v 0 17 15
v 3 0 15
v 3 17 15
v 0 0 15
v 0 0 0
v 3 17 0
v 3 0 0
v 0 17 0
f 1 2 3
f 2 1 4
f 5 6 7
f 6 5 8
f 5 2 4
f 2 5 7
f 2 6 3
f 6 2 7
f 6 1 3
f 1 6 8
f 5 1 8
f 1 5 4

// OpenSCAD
// Generated by SolidPython 1.0.1 on 2020-07-29 00:46:54


cube(size = [3, 17, 15]);
/***********************************************
*********      SolidPython code:      **********
************************************************
 
# import packages: SolidPython
from solid import *
from solid.utils import *
from itertools import chain, combinations, permutations


class Resize:

    def __init__(self, scad_file):
        self.scad_file = scad_file
        #self.scad_file = import_scad(scad_file)
        # cone/cylinder param:
        self.r1 = 0
        self.r2 = 0
        self.h = 0
        # rectangular prism param:
        self.w = 0
        self.l = 0
        # ellipse param:
        self.r = 0

    # import OpenScad code (file name corresponds to shape)


    # classify shape + parameters
    def assign(self, param1, param2, param3):
        if self.scad_file == 'cone.scad':
            self.r1 = param1
            self.r2 = param2
            self.h = param3
        elif self.scad_file == 'cylinder.scad':
            self.r1 = param1
            self.r2 = param2
            self.h = param3
        elif self.scad_file == 'rectangularPrism.scad':
            self.h = param1
            self.l = param2
            self.w = param3
        else:
            self.r = param1
            self.h = param2

    # resize parameters
    def iterate(self):
        x = range(3, 20, 2)
        i = 1
        if self.scad_file == 'cone.scad':
            tempList = list(permutations(x, 2))
            for temp in tempList:
                param1 = temp[0]
                param2 = temp[1]
                filepath = 'produced_scad_files/' + 'cone' + str(param1) + '_' + str(param2) + '_' + '.scad'
                scad_render_to_file(cylinder(h=param1, r1=param2, r2=0), filepath)

        elif self.scad_file == 'cylinder.scad':
            tempList = list(permutations(x, 3))
            for temp in tempList:
                param1 = temp[0]
                param2 = temp[1]
                filepath = 'produced_scad_files/' + 'cylinder' + str(param1) + '_' + str(param2) + '_' + '.scad'
                scad_render_to_file(cylinder(h=param1, r1=param2, r2=param2), filepath)

        elif self.scad_file == 'rectangularPrism.scad':
            tempList = list(permutations(x, 3))
            for temp in tempList:
                param1 = temp[0]
                param2 = temp[1]
                param3 = temp[2]
                filepath = 'produced_scad_files/' + 'rectangularPrism' + str(param1) + '_' + str(param2) + '_' + str(
                    param3) + '.scad'
                scad_render_to_file(cube(size=(param1, param2, param3)), filepath)

        elif self.scad_file == 'ellipse.scad':
            tempList = list(permutations(x, 4))
            for temp in tempList:
                param1 = temp[0]
                param2 = temp[1]
                param3 = temp[2]
                param4 = temp[3]
                filepath = 'produced_scad_files/' + 'ellipse' + str(param1) + '_' + str(param2) + '_' + str(param3) + '_' + str(param4) + '.scad'
                scad_render_to_file(scale([param1, param2, param3])(sphere(r=param4)), filepath)

    def render_to_scadfile(self):
        scad_render_to_file(scad, 'example.scad') 
 
************************************************/
